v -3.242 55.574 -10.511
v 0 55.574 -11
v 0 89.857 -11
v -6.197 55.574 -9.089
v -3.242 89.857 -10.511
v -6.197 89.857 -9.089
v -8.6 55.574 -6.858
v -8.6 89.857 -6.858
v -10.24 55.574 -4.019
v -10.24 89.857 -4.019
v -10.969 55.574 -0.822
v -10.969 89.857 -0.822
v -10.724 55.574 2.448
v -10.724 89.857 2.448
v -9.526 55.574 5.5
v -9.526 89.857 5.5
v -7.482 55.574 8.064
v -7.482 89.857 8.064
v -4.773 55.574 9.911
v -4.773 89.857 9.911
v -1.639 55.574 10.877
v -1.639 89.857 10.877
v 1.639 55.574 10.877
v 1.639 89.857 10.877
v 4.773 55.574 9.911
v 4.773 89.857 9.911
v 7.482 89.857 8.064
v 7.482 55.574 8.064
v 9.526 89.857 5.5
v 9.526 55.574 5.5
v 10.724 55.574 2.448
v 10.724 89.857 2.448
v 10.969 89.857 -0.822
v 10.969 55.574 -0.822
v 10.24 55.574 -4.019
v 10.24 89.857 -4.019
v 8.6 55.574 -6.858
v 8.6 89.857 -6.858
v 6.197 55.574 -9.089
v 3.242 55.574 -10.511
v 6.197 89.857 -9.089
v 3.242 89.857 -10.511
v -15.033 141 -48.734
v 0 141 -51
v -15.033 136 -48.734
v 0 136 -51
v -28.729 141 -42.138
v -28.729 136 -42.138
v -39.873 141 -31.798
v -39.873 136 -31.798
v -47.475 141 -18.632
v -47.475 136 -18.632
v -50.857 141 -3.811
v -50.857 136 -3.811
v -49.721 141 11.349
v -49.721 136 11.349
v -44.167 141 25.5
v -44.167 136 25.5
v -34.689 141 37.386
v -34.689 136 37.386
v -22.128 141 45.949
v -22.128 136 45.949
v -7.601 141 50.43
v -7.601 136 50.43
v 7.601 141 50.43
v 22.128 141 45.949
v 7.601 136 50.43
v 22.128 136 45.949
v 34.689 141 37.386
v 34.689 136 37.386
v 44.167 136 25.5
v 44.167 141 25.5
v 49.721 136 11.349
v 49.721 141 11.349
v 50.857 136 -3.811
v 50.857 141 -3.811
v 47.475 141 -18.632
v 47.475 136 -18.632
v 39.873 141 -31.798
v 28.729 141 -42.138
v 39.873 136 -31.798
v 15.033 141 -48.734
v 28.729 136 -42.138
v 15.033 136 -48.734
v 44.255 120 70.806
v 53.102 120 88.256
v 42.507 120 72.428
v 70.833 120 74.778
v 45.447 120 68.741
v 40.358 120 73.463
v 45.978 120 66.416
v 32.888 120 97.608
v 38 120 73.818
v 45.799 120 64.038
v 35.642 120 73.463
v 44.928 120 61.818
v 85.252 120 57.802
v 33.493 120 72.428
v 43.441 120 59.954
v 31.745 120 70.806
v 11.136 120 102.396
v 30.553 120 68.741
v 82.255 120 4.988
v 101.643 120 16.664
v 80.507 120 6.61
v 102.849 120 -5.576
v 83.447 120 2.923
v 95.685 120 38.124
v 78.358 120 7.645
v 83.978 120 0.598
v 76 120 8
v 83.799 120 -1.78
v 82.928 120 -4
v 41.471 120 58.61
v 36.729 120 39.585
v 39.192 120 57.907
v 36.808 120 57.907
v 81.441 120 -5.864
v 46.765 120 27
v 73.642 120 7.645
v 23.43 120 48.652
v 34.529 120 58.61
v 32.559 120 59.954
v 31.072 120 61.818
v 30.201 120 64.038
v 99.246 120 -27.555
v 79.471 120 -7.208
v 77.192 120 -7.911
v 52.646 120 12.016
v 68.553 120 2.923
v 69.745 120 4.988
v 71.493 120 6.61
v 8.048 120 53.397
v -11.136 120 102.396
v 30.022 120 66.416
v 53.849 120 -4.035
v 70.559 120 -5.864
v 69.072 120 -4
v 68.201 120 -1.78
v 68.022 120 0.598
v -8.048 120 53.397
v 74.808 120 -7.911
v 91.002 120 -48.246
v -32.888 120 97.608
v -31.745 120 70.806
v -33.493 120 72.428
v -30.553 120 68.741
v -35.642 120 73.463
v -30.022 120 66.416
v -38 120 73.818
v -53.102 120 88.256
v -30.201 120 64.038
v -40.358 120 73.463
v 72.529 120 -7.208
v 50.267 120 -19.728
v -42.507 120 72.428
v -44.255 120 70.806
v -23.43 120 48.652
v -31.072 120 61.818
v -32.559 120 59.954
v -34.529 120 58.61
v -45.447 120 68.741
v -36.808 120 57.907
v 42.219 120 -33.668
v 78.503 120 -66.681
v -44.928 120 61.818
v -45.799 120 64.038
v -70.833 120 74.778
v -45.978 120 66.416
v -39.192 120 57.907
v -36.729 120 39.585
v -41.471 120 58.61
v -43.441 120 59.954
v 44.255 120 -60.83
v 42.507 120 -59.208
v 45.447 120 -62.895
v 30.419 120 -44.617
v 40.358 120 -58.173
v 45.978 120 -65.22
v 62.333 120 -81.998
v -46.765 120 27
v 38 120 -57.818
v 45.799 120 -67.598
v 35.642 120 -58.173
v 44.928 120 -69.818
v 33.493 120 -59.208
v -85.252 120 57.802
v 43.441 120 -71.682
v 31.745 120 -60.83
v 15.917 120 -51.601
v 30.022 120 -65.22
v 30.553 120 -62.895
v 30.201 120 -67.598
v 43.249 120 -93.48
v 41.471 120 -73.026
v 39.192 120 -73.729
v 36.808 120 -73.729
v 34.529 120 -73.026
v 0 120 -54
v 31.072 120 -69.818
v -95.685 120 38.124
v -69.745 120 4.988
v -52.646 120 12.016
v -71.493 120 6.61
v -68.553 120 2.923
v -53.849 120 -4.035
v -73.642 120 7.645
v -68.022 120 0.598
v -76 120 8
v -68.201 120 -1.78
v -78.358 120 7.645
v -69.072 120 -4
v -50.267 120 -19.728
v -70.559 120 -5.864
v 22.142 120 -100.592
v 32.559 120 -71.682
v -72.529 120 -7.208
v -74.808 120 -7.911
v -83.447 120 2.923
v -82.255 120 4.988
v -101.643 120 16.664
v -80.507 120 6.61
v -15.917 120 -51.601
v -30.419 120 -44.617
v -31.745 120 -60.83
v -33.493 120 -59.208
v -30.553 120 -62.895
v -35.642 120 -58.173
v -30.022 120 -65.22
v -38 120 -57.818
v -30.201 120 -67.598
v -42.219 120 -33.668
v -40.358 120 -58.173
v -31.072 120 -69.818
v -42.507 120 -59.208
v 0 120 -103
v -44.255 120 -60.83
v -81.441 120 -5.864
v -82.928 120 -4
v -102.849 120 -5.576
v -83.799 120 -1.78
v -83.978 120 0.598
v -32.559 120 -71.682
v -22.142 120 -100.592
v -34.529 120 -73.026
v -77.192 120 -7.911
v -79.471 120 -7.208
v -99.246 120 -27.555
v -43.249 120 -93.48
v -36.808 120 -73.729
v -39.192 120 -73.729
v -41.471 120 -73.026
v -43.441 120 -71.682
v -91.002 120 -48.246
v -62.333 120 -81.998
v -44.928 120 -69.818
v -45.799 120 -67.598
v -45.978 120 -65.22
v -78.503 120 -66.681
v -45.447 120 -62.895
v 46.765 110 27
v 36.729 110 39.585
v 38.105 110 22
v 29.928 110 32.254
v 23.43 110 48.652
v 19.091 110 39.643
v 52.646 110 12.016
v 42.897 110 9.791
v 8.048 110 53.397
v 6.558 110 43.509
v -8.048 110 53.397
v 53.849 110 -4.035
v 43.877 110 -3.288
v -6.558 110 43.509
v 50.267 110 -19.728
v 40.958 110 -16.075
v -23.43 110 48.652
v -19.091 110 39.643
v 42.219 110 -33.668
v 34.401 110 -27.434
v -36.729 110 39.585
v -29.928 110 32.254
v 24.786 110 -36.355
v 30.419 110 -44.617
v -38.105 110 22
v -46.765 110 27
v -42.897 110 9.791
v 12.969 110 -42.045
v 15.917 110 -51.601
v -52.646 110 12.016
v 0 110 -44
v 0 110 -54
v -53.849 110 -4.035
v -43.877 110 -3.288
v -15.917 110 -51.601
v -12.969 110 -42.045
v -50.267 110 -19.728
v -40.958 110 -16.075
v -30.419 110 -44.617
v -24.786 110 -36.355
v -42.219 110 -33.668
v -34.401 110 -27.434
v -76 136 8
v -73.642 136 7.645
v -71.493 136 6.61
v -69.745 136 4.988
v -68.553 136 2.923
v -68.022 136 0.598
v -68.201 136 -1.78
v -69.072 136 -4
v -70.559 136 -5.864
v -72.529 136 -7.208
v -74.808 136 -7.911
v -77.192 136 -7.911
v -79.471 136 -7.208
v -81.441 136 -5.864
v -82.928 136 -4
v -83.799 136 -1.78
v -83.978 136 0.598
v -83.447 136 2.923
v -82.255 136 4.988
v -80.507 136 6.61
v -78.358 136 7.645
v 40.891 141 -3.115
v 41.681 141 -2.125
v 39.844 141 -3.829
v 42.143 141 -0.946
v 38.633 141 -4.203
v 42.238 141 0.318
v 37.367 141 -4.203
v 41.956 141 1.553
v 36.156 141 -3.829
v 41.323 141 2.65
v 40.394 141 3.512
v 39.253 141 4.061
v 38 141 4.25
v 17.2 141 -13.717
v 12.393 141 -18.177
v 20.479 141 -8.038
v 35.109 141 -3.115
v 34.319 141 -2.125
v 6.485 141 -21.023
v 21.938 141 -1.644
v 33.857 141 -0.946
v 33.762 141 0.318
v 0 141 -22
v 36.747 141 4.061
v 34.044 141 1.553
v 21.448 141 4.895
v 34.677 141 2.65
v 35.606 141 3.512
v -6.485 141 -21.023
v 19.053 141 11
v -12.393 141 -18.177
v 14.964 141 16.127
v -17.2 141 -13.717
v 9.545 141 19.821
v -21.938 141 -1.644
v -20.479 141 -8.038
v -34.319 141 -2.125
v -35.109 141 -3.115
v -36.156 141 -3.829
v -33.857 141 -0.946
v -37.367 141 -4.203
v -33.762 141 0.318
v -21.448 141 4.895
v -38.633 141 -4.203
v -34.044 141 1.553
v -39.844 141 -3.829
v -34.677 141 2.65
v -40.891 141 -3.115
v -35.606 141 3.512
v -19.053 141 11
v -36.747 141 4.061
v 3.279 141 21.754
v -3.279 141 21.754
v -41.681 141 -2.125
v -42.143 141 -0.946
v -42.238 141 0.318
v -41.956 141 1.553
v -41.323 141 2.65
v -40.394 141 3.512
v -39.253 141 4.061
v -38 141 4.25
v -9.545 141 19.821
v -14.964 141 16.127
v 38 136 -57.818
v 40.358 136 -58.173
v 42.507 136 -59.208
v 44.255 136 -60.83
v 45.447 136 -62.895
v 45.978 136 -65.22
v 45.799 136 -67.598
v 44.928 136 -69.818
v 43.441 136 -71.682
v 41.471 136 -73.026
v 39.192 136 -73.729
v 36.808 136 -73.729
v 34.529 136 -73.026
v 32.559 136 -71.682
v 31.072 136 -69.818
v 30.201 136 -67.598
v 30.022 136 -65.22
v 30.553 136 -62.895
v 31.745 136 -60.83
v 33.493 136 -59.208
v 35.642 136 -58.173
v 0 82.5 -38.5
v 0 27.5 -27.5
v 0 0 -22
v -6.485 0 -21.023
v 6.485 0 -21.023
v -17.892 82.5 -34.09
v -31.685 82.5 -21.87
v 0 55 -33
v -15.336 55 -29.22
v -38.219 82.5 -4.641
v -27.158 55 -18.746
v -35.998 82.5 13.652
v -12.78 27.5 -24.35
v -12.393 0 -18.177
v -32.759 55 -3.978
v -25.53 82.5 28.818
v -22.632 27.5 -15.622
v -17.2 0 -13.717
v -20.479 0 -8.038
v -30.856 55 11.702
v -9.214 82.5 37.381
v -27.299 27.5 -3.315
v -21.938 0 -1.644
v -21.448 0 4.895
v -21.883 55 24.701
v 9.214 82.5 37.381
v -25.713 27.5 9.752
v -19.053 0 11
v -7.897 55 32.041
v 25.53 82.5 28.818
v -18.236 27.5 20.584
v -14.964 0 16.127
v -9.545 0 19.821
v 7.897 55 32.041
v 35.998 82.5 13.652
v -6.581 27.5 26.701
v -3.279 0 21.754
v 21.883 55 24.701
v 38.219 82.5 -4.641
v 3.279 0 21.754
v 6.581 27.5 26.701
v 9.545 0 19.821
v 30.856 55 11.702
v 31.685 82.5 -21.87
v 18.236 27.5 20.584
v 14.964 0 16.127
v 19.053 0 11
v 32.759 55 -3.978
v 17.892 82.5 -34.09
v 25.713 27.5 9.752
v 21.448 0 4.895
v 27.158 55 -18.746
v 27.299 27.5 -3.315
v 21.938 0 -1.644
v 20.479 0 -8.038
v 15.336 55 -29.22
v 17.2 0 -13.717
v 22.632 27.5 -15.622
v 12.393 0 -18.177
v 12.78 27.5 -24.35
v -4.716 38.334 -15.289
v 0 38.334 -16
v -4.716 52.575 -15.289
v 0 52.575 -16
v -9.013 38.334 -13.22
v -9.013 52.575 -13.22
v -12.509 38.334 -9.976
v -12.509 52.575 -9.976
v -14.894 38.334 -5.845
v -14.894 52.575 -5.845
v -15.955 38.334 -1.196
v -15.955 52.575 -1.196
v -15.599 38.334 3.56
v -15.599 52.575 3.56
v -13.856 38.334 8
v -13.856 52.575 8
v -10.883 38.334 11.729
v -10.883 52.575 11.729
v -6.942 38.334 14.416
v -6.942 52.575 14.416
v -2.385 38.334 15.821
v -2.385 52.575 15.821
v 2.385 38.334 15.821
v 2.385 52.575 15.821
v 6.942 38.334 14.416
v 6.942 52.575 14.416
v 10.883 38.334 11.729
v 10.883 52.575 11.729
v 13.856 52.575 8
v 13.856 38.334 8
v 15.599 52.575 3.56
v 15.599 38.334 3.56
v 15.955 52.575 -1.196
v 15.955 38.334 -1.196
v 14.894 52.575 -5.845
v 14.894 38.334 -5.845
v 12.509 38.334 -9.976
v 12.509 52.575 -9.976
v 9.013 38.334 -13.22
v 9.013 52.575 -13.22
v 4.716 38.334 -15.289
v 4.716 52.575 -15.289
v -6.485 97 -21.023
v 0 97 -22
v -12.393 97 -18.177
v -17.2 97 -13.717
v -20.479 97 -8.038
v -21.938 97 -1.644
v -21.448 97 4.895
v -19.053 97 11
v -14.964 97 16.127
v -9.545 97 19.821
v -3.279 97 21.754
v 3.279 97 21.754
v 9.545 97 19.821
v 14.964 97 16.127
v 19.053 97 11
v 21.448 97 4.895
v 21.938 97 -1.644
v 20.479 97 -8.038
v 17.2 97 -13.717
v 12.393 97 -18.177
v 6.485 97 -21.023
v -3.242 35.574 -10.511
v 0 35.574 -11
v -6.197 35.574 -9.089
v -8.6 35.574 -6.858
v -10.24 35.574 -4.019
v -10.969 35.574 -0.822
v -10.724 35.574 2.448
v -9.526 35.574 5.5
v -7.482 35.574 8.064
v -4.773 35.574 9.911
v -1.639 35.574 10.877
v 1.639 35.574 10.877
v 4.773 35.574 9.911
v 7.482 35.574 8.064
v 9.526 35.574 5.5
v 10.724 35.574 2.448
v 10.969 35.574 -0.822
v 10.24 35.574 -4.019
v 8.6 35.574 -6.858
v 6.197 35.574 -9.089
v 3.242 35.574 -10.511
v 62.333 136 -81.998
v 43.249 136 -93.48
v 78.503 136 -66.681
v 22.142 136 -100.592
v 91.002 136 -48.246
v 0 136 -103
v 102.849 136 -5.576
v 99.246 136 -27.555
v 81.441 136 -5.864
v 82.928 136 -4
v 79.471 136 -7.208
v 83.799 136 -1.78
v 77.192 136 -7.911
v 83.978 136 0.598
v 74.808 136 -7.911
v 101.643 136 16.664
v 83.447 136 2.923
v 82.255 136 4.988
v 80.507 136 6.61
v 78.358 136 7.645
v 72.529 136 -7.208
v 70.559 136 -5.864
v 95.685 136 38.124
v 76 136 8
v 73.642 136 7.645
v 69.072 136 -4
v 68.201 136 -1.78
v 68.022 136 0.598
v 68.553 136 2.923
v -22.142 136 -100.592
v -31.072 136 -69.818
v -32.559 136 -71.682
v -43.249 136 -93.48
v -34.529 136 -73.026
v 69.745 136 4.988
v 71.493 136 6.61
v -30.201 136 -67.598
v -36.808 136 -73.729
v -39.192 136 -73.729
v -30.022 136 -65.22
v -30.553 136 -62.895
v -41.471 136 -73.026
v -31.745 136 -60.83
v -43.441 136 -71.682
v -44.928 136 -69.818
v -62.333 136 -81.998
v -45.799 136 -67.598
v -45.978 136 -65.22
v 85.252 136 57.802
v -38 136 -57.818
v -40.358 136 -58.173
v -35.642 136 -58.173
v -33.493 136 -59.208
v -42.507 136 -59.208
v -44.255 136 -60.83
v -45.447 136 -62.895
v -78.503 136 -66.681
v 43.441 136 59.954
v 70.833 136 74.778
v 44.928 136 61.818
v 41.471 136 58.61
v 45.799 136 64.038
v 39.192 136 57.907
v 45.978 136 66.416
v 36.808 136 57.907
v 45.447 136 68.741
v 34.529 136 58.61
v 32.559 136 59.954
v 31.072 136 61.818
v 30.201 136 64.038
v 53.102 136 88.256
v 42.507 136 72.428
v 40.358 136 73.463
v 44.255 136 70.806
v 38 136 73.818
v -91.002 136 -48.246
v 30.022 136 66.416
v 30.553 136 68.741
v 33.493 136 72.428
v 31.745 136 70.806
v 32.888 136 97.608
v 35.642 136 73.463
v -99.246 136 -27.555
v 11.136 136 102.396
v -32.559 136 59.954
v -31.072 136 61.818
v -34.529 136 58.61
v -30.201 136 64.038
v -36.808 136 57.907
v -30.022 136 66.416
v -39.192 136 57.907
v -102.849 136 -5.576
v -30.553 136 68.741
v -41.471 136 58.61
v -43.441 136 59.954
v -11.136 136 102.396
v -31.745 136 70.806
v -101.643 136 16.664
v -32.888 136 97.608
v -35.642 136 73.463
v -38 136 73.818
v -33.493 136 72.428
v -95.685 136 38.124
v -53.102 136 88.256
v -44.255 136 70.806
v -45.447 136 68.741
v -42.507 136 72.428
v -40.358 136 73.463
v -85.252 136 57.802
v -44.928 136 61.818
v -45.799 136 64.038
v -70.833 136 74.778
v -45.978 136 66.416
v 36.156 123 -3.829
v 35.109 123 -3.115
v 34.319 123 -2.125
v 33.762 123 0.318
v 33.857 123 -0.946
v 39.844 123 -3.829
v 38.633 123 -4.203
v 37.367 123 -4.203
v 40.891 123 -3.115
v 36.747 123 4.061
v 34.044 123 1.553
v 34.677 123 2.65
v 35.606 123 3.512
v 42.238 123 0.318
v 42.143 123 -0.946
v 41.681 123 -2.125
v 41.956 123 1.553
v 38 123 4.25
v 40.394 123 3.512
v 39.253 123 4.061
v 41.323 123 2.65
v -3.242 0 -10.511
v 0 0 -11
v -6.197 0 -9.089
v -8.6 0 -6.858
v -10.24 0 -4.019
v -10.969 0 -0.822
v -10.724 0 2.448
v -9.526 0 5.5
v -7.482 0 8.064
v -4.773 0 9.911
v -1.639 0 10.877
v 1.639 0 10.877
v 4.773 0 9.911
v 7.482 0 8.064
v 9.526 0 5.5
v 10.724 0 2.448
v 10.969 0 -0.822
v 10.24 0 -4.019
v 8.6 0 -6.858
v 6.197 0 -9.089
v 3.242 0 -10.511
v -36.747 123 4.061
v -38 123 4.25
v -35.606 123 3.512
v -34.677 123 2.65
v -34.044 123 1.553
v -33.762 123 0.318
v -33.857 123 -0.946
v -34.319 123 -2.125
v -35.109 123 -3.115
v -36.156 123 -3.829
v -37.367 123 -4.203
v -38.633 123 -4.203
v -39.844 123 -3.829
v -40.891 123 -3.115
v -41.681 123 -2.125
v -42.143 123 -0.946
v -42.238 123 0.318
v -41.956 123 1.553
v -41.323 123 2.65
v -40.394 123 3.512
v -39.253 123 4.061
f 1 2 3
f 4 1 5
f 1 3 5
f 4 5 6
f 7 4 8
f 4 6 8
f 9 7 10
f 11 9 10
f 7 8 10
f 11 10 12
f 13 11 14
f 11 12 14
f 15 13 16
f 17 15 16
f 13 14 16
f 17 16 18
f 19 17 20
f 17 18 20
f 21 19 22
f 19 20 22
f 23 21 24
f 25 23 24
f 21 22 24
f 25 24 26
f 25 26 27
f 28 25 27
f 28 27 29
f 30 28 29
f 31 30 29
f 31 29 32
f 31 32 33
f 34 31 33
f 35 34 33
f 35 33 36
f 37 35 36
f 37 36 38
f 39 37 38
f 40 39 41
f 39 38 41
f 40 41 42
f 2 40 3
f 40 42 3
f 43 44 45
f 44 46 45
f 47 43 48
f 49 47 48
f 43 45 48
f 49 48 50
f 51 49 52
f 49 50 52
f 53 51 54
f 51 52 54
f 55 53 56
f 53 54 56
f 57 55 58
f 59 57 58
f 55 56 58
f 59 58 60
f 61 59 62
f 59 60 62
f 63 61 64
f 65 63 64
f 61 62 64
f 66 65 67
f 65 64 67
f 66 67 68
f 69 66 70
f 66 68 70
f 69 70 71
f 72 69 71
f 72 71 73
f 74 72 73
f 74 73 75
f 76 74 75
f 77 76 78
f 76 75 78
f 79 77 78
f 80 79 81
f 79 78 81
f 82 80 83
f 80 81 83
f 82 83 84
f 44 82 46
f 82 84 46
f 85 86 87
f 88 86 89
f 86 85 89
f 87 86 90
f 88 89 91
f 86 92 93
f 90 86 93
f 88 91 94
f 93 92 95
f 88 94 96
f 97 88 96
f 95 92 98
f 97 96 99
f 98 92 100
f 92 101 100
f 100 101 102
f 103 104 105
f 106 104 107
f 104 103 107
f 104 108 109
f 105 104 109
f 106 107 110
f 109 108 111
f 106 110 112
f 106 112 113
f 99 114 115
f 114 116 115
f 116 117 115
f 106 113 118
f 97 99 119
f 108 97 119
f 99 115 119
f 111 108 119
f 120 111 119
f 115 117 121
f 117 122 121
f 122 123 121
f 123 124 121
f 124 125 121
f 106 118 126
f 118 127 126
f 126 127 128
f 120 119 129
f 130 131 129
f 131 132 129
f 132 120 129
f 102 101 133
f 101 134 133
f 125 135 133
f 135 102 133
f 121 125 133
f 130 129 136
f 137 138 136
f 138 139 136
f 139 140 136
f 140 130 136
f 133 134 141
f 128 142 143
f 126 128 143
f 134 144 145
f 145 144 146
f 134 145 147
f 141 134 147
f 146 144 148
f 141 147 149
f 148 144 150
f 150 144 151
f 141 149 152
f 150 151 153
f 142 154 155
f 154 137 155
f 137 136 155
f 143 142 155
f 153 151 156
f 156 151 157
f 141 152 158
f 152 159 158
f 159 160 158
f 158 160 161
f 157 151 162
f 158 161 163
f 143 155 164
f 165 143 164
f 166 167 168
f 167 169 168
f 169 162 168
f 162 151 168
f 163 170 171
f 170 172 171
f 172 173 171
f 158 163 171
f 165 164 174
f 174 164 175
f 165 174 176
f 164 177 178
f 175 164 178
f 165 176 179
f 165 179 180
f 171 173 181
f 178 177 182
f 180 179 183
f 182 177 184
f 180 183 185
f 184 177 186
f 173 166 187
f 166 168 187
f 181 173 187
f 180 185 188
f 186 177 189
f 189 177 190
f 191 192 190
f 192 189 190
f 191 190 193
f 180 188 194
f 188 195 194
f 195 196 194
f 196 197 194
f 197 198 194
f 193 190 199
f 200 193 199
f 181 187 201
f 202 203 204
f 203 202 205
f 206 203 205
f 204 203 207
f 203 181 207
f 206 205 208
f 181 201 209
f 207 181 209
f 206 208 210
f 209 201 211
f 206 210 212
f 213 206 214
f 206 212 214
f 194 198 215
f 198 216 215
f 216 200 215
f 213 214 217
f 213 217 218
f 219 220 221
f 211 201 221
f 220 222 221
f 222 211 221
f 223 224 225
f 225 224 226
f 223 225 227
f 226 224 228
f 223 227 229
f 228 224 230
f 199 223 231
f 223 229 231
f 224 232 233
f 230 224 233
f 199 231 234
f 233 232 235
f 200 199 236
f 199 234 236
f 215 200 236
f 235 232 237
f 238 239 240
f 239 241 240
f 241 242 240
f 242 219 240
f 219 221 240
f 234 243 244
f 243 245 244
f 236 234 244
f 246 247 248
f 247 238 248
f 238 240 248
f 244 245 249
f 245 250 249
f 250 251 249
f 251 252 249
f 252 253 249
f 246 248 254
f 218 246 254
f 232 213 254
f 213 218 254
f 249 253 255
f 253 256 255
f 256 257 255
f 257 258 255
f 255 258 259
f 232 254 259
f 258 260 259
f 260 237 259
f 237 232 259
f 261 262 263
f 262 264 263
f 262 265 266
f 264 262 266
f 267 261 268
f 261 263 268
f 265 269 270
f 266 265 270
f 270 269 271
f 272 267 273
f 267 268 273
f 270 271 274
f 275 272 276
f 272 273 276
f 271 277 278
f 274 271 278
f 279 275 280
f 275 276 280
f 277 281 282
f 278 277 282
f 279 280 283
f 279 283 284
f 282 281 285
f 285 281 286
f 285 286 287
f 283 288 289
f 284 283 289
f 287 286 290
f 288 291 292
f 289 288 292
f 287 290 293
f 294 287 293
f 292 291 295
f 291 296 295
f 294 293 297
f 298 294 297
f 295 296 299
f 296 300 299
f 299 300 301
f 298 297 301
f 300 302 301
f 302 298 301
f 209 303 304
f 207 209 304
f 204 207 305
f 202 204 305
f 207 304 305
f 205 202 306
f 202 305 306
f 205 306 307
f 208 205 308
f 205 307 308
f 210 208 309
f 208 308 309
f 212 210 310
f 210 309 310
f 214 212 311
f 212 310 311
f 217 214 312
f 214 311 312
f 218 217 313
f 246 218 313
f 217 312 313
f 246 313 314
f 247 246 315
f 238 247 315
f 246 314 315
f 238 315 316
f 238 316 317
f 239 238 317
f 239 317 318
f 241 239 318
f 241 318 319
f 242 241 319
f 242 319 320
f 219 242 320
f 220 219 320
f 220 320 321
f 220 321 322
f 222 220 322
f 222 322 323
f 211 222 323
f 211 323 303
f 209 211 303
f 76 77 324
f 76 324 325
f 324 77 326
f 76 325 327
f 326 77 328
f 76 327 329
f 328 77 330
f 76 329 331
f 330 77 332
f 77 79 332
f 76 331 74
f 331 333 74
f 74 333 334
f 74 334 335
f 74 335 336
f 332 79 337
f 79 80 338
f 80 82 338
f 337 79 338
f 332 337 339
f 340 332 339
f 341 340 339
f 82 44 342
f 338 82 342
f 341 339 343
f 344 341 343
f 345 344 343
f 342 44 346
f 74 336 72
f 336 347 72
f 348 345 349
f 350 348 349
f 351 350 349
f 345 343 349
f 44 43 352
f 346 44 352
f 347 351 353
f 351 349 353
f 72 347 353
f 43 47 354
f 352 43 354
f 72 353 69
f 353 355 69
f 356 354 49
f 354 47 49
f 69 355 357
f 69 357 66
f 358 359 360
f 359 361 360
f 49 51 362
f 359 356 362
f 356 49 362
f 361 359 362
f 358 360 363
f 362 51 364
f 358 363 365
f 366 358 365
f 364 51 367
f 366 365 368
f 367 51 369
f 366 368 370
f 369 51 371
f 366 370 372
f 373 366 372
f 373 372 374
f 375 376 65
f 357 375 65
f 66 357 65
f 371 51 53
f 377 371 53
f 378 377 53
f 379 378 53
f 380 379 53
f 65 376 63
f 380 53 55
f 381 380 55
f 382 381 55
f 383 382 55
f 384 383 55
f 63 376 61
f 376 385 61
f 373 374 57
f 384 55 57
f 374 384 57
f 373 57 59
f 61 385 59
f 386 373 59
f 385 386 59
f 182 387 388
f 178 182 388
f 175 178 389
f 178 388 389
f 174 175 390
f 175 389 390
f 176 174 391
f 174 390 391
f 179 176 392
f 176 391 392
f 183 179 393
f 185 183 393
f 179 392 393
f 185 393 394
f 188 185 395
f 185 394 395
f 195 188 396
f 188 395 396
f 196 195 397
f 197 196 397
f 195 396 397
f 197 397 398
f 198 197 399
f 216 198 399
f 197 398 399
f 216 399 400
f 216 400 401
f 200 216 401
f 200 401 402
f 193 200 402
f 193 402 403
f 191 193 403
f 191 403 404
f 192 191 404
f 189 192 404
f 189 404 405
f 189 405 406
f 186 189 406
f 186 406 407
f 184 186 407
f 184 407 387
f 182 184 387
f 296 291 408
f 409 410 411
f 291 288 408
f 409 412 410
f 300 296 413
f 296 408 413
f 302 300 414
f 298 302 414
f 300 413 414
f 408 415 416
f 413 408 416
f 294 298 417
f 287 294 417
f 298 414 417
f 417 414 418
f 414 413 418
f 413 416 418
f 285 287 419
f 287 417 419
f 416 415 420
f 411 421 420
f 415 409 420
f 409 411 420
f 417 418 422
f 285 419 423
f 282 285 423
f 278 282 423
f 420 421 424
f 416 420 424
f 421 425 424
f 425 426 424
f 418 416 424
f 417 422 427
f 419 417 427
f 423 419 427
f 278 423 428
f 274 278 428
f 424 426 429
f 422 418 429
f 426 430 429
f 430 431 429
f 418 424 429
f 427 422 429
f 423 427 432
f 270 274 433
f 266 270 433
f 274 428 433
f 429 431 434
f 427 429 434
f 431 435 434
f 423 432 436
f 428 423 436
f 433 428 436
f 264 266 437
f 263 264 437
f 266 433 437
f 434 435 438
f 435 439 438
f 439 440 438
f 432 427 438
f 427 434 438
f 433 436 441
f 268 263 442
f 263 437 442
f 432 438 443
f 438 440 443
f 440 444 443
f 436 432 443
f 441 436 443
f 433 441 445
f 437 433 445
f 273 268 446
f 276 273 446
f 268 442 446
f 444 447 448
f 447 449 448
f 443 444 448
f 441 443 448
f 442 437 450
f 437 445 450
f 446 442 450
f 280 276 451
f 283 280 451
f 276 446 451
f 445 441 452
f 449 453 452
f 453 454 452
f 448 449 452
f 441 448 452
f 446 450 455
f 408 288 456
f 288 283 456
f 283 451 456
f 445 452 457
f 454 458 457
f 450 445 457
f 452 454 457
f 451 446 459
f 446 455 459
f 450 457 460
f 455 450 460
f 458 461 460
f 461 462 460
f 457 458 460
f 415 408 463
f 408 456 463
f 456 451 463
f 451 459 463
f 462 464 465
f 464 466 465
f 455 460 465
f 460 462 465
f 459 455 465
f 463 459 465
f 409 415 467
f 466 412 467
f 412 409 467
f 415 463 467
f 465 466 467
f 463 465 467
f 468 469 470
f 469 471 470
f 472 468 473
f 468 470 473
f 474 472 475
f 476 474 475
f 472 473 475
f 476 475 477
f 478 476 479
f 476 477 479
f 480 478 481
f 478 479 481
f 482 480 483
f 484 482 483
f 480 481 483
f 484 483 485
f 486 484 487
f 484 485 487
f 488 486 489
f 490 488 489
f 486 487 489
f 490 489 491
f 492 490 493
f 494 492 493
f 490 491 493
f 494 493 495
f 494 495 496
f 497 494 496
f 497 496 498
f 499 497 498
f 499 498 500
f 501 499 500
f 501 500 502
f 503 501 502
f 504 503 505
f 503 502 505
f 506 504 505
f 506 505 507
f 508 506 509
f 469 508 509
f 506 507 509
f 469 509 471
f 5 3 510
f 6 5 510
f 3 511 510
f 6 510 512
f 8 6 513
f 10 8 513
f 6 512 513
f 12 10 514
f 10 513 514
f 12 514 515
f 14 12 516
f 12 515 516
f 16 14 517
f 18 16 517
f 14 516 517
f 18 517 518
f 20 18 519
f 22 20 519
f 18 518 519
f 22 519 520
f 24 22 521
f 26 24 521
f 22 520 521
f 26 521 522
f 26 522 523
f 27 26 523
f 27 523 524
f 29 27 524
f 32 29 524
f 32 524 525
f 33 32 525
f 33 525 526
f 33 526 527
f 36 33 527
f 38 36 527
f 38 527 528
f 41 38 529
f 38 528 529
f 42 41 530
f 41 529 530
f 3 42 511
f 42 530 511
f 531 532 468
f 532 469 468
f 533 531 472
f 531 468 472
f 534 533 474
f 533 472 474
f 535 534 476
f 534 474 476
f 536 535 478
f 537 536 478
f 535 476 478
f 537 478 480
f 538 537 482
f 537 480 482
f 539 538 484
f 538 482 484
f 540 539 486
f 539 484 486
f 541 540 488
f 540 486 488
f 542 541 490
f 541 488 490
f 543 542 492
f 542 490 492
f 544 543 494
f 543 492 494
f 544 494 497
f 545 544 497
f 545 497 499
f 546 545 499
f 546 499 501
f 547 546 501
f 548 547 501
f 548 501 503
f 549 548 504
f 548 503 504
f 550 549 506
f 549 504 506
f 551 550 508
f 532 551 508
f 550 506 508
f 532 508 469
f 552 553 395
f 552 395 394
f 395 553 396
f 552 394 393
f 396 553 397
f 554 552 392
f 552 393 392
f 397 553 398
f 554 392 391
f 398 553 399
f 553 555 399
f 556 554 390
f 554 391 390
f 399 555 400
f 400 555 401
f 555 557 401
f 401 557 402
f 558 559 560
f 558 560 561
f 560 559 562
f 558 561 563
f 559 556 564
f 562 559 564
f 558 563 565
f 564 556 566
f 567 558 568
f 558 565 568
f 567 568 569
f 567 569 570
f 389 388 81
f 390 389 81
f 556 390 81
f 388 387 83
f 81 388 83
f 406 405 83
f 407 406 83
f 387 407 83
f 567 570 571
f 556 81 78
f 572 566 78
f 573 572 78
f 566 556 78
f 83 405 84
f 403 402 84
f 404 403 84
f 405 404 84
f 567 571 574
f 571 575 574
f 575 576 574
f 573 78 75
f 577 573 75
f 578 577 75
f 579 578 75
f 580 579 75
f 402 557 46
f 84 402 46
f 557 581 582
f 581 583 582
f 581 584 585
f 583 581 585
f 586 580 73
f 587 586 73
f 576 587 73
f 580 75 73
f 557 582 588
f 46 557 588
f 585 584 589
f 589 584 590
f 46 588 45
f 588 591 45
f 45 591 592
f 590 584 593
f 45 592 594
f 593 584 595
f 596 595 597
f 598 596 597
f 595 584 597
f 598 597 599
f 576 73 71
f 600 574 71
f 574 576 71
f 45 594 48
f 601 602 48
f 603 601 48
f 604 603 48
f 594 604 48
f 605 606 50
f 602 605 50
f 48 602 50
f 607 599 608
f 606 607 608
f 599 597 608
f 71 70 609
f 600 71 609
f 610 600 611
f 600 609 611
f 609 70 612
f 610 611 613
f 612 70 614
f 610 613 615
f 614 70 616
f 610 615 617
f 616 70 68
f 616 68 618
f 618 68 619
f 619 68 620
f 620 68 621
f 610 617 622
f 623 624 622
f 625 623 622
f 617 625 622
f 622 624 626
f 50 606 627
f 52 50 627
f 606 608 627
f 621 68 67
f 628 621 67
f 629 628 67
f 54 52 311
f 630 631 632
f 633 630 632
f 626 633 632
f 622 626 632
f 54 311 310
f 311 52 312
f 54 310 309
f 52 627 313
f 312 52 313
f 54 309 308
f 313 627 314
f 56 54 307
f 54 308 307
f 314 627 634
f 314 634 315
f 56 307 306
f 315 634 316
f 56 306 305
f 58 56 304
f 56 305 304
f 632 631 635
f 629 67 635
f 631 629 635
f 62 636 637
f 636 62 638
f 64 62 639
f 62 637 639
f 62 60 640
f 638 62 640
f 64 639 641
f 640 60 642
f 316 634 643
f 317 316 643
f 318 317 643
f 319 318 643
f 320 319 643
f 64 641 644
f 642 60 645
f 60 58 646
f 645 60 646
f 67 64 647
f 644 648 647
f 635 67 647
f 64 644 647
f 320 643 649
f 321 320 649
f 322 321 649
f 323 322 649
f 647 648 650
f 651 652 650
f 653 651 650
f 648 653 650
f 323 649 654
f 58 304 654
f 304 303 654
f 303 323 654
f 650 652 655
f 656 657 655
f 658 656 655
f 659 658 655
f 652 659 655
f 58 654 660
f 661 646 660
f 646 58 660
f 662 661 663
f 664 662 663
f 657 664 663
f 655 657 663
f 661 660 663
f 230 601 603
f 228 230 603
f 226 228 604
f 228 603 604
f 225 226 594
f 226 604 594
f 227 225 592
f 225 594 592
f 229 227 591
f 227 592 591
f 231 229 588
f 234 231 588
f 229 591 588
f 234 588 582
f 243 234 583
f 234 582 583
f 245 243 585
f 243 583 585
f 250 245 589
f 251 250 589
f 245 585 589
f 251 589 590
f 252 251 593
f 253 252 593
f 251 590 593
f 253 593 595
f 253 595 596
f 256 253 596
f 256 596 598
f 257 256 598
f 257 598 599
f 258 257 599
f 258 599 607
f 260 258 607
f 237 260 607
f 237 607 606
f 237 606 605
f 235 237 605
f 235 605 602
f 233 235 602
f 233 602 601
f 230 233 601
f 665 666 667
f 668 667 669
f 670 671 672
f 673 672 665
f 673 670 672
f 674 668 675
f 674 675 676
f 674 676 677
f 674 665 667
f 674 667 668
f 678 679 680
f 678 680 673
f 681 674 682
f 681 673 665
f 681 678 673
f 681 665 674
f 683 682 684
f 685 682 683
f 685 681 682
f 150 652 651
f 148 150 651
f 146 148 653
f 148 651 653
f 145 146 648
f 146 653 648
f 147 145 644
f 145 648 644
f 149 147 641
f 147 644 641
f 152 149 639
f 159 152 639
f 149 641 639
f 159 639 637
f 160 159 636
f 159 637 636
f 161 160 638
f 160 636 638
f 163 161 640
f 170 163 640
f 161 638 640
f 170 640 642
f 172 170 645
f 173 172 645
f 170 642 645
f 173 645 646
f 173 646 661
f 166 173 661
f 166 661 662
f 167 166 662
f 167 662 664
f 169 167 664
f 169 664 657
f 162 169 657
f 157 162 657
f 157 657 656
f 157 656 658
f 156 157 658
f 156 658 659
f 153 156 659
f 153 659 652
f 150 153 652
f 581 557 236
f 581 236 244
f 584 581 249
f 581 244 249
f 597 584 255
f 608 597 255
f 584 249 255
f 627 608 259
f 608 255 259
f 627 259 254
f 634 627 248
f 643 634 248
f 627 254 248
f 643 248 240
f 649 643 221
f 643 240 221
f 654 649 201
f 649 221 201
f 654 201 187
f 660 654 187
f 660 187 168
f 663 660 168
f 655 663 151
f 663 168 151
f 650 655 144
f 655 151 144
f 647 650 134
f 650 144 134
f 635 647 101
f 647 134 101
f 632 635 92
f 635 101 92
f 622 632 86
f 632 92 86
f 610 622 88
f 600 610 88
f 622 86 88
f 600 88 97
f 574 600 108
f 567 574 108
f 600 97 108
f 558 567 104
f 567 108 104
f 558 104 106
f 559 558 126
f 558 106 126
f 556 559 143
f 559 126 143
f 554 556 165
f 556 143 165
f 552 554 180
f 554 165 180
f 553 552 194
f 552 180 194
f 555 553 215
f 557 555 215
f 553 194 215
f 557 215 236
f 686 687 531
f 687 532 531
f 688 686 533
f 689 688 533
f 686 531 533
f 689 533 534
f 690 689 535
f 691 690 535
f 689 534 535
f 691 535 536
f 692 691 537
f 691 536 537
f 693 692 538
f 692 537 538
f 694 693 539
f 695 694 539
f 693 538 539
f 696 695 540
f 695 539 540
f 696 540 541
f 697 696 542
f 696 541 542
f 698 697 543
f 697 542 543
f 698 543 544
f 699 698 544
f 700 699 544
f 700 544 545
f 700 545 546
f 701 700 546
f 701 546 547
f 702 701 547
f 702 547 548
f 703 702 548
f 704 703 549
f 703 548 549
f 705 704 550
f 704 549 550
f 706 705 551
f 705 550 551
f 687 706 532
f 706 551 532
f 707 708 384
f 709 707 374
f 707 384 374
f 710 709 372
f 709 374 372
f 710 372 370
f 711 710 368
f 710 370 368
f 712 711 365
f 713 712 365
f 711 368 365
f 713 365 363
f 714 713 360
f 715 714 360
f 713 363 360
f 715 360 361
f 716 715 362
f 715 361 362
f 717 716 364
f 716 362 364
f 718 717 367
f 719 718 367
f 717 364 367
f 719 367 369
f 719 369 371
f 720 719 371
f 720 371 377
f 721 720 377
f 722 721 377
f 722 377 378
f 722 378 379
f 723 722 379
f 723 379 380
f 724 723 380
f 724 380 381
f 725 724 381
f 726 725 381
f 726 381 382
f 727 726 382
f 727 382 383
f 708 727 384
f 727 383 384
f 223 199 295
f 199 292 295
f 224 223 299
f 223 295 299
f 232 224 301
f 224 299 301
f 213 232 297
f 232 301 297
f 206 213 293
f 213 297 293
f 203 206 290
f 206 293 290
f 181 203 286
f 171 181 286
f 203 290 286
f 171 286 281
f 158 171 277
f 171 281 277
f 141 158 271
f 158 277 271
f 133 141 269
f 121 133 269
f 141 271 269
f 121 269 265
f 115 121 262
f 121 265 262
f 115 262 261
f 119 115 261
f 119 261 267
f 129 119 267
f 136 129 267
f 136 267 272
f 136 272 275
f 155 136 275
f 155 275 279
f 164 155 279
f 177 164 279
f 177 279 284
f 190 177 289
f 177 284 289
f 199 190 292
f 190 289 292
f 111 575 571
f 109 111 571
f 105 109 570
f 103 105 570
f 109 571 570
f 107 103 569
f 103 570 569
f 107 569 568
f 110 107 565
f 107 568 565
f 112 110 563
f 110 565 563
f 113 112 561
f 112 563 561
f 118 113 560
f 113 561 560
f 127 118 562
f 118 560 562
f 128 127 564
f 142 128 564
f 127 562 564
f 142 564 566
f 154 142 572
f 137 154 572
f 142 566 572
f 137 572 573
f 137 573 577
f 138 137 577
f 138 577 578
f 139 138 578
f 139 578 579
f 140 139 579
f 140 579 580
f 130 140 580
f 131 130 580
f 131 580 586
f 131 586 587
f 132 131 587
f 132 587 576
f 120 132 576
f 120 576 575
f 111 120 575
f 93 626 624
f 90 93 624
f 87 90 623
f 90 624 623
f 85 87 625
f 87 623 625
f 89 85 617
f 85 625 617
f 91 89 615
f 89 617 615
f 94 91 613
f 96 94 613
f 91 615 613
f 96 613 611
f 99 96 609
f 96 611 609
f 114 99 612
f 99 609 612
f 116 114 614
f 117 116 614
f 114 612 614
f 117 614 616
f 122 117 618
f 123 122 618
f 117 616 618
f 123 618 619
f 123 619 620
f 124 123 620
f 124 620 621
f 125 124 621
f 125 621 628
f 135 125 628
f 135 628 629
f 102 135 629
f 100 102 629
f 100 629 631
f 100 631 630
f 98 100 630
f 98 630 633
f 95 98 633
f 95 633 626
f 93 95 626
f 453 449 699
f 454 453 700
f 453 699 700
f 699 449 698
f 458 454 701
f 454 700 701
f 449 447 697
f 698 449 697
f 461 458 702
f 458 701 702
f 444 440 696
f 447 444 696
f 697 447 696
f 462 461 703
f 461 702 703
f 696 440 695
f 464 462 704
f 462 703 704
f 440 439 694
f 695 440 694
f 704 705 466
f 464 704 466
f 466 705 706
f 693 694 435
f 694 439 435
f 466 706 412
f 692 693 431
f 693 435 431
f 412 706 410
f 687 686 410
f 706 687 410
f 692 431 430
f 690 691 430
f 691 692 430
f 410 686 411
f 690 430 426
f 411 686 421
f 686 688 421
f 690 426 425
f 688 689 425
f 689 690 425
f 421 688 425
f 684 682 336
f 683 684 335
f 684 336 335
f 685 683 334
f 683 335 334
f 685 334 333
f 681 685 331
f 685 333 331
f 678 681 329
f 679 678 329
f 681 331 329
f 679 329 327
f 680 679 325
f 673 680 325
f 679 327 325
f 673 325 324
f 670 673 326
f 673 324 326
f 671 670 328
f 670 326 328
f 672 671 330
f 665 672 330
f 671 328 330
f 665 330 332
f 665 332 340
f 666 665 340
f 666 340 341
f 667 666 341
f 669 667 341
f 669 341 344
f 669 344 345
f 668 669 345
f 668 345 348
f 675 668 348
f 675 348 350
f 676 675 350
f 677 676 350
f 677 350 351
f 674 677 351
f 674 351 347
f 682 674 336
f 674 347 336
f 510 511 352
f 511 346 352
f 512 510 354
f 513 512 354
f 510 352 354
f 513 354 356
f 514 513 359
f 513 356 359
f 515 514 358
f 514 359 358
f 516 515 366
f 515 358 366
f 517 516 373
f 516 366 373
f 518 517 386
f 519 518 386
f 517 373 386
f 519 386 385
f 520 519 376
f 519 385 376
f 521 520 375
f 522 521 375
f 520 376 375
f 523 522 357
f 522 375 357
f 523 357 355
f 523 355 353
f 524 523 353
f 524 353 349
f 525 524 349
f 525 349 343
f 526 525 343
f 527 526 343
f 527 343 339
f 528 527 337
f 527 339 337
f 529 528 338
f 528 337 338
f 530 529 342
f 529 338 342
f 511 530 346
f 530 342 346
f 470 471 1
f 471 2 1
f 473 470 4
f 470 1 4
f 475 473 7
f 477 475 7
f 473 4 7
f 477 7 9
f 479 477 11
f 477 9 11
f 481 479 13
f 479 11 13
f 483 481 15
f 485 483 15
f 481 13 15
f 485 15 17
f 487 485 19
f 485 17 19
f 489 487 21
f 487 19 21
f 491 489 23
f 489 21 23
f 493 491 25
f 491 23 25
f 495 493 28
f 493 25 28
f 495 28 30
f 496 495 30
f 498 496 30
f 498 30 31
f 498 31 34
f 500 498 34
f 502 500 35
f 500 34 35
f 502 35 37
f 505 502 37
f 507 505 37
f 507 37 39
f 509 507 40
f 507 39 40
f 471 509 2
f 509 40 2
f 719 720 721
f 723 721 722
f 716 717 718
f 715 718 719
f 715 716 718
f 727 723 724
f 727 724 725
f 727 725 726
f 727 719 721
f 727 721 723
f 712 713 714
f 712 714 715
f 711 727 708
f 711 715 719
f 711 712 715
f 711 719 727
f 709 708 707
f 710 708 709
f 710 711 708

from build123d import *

# Parameters (mm, degrees)
SKETCH2_R          = 8
CUT_EXTRUDE1_DEPTH = 200.283717348
SKETCH3_R          = 4.25
CUT_EXTRUDE2_DEPTH = 18


with BuildPart() as part:
    # Sketch1 → Revolve1 (revolve)
    with BuildSketch(Plane.XY):
        Polygon((-22, 0), (-11, 0), (-11, 35.574468085), (-16, 38.334450356), (-16, 52.574533983), (-11, 55.574468085), (-11, 89.856516475), (-22, 97), (-22, 141), (-51, 141), (-51, 136), (-103, 136), (-103, 120), (-54, 120), (-54, 110), (-44, 110), align=None)
    revolve(axis=Axis((0, 0, 0), (0, 1, 0)))

    # Sketch2 → Cut-Extrude1 (cut, through all)
    with BuildSketch(Plane(origin=(0, 136, 0), x_dir=(1, 0, 0), z_dir=(0, 1, 0))):
        with Locations((-76, 0)):
            Circle(SKETCH2_R)
        with Locations((-38, 65.817930688)):
            Circle(SKETCH2_R)
        with Locations((38, 65.817930688)):
            Circle(SKETCH2_R)
        with Locations((76, 0)):
            Circle(SKETCH2_R)
        with Locations((38, -65.817930688)):
            Circle(SKETCH2_R)
        with Locations((-38, -65.817930688)):
            Circle(SKETCH2_R)
    extrude(amount=-CUT_EXTRUDE1_DEPTH, mode=Mode.SUBTRACT)

    # Sketch3 → Cut-Extrude2 (cut)
    with BuildSketch(Plane(origin=(0, 141, 0), x_dir=(1, 0, 0), z_dir=(0, 1, 0))):
        with Locations((-38, 0)):
            Circle(SKETCH3_R)
        with Locations((38, 0)):
            Circle(SKETCH3_R)
    extrude(amount=-CUT_EXTRUDE2_DEPTH, mode=Mode.SUBTRACT)


solid = part.part
